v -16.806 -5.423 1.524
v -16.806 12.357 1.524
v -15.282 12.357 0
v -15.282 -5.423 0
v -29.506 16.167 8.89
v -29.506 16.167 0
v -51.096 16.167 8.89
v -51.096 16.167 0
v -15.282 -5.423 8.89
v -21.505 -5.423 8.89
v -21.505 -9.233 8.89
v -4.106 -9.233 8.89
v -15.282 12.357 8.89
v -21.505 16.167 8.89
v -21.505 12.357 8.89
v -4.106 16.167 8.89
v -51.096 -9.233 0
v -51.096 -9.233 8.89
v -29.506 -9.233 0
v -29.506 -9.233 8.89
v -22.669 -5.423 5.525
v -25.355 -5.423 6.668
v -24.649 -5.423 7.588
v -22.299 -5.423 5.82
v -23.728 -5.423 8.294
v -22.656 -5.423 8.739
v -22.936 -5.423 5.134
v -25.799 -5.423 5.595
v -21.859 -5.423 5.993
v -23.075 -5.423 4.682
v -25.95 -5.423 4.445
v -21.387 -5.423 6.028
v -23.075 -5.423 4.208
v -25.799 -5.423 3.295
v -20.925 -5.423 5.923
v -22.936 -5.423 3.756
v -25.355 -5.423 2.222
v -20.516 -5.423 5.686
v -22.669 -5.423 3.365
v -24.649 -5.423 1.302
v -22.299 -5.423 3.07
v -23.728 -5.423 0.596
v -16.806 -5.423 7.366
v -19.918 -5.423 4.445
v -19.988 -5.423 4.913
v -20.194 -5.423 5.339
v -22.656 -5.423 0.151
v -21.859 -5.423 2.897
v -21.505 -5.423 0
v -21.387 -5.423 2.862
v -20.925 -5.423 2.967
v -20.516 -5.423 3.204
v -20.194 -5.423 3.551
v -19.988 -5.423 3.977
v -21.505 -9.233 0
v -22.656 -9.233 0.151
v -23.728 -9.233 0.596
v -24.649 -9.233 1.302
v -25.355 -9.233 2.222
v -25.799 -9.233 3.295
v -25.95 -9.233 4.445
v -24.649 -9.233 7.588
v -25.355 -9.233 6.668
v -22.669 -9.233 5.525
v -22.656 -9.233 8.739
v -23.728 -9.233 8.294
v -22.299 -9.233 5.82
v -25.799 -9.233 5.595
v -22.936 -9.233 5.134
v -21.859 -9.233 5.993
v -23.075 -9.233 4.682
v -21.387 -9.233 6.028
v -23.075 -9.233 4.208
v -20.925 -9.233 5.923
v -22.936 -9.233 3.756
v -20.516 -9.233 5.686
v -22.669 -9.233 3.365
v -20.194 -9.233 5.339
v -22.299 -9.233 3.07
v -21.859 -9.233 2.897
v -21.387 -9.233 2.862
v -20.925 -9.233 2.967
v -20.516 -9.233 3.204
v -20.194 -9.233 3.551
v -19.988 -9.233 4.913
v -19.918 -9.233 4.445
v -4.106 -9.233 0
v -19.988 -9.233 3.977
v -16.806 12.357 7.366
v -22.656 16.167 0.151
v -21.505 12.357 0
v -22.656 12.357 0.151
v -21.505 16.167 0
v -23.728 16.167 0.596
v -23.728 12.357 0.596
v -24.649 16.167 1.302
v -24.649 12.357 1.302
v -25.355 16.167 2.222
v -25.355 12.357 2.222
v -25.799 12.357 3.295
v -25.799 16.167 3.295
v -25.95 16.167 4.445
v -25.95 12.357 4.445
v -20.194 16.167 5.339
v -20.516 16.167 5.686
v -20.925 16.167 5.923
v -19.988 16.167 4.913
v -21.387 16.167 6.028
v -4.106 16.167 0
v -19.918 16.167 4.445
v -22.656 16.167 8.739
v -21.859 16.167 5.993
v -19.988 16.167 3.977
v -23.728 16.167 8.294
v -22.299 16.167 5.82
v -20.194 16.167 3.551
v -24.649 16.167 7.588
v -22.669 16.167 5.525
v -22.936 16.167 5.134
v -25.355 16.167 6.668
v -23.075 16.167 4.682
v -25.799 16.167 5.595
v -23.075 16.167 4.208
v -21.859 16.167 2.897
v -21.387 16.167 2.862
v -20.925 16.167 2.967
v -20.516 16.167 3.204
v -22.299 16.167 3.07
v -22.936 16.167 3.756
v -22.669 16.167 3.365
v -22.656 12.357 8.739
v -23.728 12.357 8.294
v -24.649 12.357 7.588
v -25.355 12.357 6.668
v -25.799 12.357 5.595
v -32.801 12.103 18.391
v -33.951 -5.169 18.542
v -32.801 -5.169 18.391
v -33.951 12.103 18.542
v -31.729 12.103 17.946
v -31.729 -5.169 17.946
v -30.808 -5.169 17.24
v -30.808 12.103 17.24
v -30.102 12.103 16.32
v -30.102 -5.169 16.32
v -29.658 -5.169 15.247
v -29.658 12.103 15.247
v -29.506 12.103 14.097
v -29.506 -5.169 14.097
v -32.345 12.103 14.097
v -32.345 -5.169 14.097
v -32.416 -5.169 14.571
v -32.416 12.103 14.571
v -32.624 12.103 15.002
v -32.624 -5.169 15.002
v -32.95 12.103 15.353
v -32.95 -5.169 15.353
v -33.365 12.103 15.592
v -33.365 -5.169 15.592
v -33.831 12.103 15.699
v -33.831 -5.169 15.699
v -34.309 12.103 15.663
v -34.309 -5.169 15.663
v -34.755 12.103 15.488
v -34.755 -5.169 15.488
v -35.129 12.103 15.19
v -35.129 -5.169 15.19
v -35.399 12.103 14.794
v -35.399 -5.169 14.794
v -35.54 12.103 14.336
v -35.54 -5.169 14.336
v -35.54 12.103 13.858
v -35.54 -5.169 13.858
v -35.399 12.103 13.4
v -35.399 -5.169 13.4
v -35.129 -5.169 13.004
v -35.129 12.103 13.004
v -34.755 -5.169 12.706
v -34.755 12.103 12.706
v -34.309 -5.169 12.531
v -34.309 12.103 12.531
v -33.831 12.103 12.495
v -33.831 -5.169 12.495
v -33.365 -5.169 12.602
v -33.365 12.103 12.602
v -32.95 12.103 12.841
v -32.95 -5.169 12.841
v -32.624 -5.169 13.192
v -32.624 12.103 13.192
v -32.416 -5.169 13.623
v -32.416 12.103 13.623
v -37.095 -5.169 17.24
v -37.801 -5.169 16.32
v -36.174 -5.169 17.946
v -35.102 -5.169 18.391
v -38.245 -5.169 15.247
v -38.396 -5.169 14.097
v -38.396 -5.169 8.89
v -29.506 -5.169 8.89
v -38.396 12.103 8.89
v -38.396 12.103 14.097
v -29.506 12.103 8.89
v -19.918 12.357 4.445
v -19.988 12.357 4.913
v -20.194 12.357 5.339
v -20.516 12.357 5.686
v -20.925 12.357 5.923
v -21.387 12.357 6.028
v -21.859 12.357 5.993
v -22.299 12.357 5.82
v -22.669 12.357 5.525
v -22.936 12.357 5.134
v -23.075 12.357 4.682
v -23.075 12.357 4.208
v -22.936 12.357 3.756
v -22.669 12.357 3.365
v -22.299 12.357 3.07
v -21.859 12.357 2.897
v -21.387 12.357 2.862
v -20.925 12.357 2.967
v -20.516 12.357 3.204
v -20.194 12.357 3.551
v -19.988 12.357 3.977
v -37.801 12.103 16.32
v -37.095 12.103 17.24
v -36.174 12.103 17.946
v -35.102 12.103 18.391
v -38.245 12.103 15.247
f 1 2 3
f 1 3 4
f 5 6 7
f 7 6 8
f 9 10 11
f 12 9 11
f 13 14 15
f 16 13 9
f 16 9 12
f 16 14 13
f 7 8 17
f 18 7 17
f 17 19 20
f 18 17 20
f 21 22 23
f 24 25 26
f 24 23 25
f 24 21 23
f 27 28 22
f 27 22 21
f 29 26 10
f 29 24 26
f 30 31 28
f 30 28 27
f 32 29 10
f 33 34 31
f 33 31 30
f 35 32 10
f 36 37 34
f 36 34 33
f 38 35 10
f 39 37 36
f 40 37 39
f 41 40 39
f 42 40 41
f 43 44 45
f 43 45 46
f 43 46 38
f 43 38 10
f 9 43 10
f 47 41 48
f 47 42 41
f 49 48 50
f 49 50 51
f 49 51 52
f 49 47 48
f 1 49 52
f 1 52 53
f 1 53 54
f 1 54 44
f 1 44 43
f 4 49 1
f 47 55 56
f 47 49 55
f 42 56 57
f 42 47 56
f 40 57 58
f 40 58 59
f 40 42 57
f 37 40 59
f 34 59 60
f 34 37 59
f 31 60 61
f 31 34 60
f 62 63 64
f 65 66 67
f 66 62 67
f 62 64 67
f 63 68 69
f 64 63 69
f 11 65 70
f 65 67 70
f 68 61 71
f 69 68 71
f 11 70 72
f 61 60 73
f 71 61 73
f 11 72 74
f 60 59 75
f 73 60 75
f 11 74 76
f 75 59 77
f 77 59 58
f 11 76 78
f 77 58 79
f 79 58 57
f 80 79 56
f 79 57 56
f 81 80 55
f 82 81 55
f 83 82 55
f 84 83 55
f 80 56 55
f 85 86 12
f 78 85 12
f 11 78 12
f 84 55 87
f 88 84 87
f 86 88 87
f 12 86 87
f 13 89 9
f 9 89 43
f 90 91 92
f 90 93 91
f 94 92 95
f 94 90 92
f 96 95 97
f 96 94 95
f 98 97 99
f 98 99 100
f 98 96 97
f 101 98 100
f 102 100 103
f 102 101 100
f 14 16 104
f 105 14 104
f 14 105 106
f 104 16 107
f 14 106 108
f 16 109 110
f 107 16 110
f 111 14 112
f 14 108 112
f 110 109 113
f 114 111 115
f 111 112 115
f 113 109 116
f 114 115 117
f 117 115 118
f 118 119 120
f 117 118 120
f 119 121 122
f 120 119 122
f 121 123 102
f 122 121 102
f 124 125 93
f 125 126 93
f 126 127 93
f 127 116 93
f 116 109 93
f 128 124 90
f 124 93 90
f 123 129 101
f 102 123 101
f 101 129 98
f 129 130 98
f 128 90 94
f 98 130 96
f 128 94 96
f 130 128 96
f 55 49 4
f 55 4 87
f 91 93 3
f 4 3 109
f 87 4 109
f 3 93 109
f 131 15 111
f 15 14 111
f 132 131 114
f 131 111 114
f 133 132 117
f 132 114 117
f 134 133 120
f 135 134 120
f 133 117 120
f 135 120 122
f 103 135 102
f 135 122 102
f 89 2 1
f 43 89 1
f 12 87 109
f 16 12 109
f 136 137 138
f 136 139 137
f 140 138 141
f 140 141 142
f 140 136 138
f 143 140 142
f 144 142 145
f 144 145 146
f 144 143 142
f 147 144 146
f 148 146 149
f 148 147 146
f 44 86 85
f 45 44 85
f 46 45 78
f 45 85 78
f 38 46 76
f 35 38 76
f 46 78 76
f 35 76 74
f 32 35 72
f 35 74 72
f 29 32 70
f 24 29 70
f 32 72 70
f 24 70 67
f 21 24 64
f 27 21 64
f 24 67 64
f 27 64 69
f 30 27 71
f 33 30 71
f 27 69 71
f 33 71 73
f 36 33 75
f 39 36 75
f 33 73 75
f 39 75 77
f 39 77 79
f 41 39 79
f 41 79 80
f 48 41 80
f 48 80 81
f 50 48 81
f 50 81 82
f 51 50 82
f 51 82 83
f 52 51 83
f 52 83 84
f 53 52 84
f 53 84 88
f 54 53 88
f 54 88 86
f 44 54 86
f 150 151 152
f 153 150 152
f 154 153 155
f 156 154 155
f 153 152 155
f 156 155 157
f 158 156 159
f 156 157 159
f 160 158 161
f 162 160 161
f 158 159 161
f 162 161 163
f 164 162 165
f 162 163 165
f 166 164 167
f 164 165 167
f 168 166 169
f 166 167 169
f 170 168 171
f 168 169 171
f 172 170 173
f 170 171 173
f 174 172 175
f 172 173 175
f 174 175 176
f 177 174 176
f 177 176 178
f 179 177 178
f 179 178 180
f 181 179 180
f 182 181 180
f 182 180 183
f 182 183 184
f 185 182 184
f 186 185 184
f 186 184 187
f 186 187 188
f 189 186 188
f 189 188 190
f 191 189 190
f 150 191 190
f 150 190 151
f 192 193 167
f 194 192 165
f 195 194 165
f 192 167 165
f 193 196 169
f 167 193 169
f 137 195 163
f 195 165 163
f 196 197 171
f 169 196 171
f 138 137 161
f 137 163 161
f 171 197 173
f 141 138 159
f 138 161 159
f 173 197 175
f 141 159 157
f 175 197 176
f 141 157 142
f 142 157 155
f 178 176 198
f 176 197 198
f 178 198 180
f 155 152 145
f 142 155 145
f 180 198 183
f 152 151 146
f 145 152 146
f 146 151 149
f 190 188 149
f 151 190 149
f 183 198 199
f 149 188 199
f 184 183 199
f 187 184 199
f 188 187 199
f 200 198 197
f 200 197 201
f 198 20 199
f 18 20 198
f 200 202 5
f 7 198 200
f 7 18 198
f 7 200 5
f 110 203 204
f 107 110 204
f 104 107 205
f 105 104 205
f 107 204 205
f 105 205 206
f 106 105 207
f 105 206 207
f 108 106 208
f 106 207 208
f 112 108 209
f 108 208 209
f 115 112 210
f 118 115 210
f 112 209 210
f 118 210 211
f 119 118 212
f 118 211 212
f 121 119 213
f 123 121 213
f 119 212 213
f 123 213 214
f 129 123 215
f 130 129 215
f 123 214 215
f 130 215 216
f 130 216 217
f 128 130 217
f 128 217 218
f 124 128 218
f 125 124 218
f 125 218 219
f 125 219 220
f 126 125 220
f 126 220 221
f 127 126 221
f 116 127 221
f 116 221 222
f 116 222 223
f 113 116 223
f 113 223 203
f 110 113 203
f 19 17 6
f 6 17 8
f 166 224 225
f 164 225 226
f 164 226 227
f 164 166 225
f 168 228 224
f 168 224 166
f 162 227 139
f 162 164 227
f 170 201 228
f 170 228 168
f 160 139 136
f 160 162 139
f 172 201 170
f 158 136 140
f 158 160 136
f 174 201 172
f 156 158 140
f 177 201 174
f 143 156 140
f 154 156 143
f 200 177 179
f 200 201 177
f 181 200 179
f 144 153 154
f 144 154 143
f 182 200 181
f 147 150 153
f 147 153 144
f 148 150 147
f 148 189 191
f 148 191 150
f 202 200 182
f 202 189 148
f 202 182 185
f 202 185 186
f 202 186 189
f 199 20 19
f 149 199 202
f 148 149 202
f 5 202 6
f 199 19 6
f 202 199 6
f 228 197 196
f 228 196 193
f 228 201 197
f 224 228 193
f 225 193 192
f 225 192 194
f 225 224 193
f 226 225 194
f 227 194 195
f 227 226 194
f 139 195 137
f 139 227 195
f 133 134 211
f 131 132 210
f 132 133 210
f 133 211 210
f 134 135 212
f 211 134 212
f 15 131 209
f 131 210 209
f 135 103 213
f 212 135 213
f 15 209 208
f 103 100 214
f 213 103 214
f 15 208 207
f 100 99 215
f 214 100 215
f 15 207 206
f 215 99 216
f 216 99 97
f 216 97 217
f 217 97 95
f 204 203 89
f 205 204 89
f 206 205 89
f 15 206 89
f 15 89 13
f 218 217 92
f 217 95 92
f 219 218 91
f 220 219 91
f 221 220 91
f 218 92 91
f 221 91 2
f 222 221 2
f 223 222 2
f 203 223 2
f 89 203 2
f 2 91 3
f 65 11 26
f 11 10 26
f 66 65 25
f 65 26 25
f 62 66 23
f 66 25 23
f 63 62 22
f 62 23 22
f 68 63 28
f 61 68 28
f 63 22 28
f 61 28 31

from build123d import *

# Parameters (mm, degrees)
F0_W      = 9.144
F0_H      = 3.81
F1_DEPTH  = 8.89
F3_DEPTH  = 8.89
F4_W      = 8.89
F4_H      = 17.272
F5_DEPTH  = 9.652
F6_R      = 1.60655
F7_DEPTH  = 25.4
F8_R      = 1.5875
F9_DEPTH  = 25.4
F10_R     = 4.44499
F10_2_R   = 4.44499
F11_SIZE  = 1.524
F12_DEPTH = 8.89


# Not quite as in the source:
# - a fillet or chamfer is up to 0.001 mm smaller than in the source, because OpenCascade refuses the exact size


with BuildPart() as f1:
    # F0 (on Top) → F1 (new body)
    with BuildSketch(Plane.XY):
        Polygon((-4.1064491987, 16.167118521), (-16.8064491987, 16.167118521), (-16.8064491987, 12.357118521), (-16.8064491987, -5.422881479), (-16.8064491987, -9.232881479), (-4.1064491987, -9.232881479), align=None)
        with Locations((-21.3784491987, 14.262118521)):
            Rectangle(F0_W, F0_H)
        with Locations((-21.3784491987, -7.327881479)):
            Rectangle(F0_W, F0_H)
    extrude(amount=F1_DEPTH)

    # F8 (on face) → F9 (cut)
    with BuildSketch(Plane.XZ.offset(9.232881479)):
        with Locations((-21.5054491987, 4.445)):
            Circle(F8_R)
    extrude(amount=-F9_DEPTH, mode=Mode.SUBTRACT)

    # F10#2 (radius 4.445 in the source; OpenCascade refuses exactly that, so slightly less here)
    f10_2_edges = [f1.edges().sort_by_distance(p)[0] for p in [
        (-25.950449, -7.327881, 8.89),
        (-25.950449, -7.327881, 0),
        (-25.950449, 14.262119, 0),
        (-25.950449, 14.262119, 8.89),
    ]]
    fillet(f10_2_edges, radius=F10_2_R)

    # F11
    f11_edges = [f1.edges().sort_by_distance(p)[0] for p in [
        (-16.806449, 3.467119, 8.89),
        (-16.806449, 3.467119, 0),
    ]]
    chamfer(f11_edges, length=F11_SIZE)


with BuildPart() as f3:
    # F2 (on Top) → F3 (new body)
    with BuildSketch(Plane.XY):
        Polygon((-38.3964491987, 12.103118521), (-38.3964491987, 16.167118521), (-51.0964491987, 16.167118521), (-51.0964491987, -9.232881479), (-38.3964491987, -9.232881479), (-38.3964491987, -5.168881479), (-29.5064491987, -5.168881479), (-29.5064491987, 12.103118521), align=None)
    extrude(amount=F3_DEPTH)

    # F4 (on face) → F5 (join)
    with BuildSketch(Plane.XY.offset(8.89)):
        with Locations((-33.9514491987, 3.467118521)):
            Rectangle(F4_W, F4_H)
    extrude(amount=F5_DEPTH)

    # F6 (on face) → F7 (cut)
    with BuildSketch(Plane.XZ.offset(5.168881479)):
        with Locations((-33.9514491987, 14.097)):
            Circle(F6_R)
    extrude(amount=-F7_DEPTH, mode=Mode.SUBTRACT)

    # F10 (radius 4.445 in the source; OpenCascade refuses exactly that, so slightly less here)
    f10_edges = [f3.edges().sort_by_distance(p)[0] for p in [
        (-29.506449, 3.467119, 18.542),
        (-38.396449, 3.467119, 18.542),
    ]]
    fillet(f10_edges, radius=F10_R)

    # F12 (add, through all): faces of the model
    f12_faces = [f3.faces().sort_by_distance(p)[0] for p in [
        (-38.3964491987, -7.200881479, 4.445),
        (-38.3964491987, 14.135118521, 4.445),
    ]]
    extrude(f12_faces, amount=F12_DEPTH)


solid = Compound([f1.part, f3.part])
